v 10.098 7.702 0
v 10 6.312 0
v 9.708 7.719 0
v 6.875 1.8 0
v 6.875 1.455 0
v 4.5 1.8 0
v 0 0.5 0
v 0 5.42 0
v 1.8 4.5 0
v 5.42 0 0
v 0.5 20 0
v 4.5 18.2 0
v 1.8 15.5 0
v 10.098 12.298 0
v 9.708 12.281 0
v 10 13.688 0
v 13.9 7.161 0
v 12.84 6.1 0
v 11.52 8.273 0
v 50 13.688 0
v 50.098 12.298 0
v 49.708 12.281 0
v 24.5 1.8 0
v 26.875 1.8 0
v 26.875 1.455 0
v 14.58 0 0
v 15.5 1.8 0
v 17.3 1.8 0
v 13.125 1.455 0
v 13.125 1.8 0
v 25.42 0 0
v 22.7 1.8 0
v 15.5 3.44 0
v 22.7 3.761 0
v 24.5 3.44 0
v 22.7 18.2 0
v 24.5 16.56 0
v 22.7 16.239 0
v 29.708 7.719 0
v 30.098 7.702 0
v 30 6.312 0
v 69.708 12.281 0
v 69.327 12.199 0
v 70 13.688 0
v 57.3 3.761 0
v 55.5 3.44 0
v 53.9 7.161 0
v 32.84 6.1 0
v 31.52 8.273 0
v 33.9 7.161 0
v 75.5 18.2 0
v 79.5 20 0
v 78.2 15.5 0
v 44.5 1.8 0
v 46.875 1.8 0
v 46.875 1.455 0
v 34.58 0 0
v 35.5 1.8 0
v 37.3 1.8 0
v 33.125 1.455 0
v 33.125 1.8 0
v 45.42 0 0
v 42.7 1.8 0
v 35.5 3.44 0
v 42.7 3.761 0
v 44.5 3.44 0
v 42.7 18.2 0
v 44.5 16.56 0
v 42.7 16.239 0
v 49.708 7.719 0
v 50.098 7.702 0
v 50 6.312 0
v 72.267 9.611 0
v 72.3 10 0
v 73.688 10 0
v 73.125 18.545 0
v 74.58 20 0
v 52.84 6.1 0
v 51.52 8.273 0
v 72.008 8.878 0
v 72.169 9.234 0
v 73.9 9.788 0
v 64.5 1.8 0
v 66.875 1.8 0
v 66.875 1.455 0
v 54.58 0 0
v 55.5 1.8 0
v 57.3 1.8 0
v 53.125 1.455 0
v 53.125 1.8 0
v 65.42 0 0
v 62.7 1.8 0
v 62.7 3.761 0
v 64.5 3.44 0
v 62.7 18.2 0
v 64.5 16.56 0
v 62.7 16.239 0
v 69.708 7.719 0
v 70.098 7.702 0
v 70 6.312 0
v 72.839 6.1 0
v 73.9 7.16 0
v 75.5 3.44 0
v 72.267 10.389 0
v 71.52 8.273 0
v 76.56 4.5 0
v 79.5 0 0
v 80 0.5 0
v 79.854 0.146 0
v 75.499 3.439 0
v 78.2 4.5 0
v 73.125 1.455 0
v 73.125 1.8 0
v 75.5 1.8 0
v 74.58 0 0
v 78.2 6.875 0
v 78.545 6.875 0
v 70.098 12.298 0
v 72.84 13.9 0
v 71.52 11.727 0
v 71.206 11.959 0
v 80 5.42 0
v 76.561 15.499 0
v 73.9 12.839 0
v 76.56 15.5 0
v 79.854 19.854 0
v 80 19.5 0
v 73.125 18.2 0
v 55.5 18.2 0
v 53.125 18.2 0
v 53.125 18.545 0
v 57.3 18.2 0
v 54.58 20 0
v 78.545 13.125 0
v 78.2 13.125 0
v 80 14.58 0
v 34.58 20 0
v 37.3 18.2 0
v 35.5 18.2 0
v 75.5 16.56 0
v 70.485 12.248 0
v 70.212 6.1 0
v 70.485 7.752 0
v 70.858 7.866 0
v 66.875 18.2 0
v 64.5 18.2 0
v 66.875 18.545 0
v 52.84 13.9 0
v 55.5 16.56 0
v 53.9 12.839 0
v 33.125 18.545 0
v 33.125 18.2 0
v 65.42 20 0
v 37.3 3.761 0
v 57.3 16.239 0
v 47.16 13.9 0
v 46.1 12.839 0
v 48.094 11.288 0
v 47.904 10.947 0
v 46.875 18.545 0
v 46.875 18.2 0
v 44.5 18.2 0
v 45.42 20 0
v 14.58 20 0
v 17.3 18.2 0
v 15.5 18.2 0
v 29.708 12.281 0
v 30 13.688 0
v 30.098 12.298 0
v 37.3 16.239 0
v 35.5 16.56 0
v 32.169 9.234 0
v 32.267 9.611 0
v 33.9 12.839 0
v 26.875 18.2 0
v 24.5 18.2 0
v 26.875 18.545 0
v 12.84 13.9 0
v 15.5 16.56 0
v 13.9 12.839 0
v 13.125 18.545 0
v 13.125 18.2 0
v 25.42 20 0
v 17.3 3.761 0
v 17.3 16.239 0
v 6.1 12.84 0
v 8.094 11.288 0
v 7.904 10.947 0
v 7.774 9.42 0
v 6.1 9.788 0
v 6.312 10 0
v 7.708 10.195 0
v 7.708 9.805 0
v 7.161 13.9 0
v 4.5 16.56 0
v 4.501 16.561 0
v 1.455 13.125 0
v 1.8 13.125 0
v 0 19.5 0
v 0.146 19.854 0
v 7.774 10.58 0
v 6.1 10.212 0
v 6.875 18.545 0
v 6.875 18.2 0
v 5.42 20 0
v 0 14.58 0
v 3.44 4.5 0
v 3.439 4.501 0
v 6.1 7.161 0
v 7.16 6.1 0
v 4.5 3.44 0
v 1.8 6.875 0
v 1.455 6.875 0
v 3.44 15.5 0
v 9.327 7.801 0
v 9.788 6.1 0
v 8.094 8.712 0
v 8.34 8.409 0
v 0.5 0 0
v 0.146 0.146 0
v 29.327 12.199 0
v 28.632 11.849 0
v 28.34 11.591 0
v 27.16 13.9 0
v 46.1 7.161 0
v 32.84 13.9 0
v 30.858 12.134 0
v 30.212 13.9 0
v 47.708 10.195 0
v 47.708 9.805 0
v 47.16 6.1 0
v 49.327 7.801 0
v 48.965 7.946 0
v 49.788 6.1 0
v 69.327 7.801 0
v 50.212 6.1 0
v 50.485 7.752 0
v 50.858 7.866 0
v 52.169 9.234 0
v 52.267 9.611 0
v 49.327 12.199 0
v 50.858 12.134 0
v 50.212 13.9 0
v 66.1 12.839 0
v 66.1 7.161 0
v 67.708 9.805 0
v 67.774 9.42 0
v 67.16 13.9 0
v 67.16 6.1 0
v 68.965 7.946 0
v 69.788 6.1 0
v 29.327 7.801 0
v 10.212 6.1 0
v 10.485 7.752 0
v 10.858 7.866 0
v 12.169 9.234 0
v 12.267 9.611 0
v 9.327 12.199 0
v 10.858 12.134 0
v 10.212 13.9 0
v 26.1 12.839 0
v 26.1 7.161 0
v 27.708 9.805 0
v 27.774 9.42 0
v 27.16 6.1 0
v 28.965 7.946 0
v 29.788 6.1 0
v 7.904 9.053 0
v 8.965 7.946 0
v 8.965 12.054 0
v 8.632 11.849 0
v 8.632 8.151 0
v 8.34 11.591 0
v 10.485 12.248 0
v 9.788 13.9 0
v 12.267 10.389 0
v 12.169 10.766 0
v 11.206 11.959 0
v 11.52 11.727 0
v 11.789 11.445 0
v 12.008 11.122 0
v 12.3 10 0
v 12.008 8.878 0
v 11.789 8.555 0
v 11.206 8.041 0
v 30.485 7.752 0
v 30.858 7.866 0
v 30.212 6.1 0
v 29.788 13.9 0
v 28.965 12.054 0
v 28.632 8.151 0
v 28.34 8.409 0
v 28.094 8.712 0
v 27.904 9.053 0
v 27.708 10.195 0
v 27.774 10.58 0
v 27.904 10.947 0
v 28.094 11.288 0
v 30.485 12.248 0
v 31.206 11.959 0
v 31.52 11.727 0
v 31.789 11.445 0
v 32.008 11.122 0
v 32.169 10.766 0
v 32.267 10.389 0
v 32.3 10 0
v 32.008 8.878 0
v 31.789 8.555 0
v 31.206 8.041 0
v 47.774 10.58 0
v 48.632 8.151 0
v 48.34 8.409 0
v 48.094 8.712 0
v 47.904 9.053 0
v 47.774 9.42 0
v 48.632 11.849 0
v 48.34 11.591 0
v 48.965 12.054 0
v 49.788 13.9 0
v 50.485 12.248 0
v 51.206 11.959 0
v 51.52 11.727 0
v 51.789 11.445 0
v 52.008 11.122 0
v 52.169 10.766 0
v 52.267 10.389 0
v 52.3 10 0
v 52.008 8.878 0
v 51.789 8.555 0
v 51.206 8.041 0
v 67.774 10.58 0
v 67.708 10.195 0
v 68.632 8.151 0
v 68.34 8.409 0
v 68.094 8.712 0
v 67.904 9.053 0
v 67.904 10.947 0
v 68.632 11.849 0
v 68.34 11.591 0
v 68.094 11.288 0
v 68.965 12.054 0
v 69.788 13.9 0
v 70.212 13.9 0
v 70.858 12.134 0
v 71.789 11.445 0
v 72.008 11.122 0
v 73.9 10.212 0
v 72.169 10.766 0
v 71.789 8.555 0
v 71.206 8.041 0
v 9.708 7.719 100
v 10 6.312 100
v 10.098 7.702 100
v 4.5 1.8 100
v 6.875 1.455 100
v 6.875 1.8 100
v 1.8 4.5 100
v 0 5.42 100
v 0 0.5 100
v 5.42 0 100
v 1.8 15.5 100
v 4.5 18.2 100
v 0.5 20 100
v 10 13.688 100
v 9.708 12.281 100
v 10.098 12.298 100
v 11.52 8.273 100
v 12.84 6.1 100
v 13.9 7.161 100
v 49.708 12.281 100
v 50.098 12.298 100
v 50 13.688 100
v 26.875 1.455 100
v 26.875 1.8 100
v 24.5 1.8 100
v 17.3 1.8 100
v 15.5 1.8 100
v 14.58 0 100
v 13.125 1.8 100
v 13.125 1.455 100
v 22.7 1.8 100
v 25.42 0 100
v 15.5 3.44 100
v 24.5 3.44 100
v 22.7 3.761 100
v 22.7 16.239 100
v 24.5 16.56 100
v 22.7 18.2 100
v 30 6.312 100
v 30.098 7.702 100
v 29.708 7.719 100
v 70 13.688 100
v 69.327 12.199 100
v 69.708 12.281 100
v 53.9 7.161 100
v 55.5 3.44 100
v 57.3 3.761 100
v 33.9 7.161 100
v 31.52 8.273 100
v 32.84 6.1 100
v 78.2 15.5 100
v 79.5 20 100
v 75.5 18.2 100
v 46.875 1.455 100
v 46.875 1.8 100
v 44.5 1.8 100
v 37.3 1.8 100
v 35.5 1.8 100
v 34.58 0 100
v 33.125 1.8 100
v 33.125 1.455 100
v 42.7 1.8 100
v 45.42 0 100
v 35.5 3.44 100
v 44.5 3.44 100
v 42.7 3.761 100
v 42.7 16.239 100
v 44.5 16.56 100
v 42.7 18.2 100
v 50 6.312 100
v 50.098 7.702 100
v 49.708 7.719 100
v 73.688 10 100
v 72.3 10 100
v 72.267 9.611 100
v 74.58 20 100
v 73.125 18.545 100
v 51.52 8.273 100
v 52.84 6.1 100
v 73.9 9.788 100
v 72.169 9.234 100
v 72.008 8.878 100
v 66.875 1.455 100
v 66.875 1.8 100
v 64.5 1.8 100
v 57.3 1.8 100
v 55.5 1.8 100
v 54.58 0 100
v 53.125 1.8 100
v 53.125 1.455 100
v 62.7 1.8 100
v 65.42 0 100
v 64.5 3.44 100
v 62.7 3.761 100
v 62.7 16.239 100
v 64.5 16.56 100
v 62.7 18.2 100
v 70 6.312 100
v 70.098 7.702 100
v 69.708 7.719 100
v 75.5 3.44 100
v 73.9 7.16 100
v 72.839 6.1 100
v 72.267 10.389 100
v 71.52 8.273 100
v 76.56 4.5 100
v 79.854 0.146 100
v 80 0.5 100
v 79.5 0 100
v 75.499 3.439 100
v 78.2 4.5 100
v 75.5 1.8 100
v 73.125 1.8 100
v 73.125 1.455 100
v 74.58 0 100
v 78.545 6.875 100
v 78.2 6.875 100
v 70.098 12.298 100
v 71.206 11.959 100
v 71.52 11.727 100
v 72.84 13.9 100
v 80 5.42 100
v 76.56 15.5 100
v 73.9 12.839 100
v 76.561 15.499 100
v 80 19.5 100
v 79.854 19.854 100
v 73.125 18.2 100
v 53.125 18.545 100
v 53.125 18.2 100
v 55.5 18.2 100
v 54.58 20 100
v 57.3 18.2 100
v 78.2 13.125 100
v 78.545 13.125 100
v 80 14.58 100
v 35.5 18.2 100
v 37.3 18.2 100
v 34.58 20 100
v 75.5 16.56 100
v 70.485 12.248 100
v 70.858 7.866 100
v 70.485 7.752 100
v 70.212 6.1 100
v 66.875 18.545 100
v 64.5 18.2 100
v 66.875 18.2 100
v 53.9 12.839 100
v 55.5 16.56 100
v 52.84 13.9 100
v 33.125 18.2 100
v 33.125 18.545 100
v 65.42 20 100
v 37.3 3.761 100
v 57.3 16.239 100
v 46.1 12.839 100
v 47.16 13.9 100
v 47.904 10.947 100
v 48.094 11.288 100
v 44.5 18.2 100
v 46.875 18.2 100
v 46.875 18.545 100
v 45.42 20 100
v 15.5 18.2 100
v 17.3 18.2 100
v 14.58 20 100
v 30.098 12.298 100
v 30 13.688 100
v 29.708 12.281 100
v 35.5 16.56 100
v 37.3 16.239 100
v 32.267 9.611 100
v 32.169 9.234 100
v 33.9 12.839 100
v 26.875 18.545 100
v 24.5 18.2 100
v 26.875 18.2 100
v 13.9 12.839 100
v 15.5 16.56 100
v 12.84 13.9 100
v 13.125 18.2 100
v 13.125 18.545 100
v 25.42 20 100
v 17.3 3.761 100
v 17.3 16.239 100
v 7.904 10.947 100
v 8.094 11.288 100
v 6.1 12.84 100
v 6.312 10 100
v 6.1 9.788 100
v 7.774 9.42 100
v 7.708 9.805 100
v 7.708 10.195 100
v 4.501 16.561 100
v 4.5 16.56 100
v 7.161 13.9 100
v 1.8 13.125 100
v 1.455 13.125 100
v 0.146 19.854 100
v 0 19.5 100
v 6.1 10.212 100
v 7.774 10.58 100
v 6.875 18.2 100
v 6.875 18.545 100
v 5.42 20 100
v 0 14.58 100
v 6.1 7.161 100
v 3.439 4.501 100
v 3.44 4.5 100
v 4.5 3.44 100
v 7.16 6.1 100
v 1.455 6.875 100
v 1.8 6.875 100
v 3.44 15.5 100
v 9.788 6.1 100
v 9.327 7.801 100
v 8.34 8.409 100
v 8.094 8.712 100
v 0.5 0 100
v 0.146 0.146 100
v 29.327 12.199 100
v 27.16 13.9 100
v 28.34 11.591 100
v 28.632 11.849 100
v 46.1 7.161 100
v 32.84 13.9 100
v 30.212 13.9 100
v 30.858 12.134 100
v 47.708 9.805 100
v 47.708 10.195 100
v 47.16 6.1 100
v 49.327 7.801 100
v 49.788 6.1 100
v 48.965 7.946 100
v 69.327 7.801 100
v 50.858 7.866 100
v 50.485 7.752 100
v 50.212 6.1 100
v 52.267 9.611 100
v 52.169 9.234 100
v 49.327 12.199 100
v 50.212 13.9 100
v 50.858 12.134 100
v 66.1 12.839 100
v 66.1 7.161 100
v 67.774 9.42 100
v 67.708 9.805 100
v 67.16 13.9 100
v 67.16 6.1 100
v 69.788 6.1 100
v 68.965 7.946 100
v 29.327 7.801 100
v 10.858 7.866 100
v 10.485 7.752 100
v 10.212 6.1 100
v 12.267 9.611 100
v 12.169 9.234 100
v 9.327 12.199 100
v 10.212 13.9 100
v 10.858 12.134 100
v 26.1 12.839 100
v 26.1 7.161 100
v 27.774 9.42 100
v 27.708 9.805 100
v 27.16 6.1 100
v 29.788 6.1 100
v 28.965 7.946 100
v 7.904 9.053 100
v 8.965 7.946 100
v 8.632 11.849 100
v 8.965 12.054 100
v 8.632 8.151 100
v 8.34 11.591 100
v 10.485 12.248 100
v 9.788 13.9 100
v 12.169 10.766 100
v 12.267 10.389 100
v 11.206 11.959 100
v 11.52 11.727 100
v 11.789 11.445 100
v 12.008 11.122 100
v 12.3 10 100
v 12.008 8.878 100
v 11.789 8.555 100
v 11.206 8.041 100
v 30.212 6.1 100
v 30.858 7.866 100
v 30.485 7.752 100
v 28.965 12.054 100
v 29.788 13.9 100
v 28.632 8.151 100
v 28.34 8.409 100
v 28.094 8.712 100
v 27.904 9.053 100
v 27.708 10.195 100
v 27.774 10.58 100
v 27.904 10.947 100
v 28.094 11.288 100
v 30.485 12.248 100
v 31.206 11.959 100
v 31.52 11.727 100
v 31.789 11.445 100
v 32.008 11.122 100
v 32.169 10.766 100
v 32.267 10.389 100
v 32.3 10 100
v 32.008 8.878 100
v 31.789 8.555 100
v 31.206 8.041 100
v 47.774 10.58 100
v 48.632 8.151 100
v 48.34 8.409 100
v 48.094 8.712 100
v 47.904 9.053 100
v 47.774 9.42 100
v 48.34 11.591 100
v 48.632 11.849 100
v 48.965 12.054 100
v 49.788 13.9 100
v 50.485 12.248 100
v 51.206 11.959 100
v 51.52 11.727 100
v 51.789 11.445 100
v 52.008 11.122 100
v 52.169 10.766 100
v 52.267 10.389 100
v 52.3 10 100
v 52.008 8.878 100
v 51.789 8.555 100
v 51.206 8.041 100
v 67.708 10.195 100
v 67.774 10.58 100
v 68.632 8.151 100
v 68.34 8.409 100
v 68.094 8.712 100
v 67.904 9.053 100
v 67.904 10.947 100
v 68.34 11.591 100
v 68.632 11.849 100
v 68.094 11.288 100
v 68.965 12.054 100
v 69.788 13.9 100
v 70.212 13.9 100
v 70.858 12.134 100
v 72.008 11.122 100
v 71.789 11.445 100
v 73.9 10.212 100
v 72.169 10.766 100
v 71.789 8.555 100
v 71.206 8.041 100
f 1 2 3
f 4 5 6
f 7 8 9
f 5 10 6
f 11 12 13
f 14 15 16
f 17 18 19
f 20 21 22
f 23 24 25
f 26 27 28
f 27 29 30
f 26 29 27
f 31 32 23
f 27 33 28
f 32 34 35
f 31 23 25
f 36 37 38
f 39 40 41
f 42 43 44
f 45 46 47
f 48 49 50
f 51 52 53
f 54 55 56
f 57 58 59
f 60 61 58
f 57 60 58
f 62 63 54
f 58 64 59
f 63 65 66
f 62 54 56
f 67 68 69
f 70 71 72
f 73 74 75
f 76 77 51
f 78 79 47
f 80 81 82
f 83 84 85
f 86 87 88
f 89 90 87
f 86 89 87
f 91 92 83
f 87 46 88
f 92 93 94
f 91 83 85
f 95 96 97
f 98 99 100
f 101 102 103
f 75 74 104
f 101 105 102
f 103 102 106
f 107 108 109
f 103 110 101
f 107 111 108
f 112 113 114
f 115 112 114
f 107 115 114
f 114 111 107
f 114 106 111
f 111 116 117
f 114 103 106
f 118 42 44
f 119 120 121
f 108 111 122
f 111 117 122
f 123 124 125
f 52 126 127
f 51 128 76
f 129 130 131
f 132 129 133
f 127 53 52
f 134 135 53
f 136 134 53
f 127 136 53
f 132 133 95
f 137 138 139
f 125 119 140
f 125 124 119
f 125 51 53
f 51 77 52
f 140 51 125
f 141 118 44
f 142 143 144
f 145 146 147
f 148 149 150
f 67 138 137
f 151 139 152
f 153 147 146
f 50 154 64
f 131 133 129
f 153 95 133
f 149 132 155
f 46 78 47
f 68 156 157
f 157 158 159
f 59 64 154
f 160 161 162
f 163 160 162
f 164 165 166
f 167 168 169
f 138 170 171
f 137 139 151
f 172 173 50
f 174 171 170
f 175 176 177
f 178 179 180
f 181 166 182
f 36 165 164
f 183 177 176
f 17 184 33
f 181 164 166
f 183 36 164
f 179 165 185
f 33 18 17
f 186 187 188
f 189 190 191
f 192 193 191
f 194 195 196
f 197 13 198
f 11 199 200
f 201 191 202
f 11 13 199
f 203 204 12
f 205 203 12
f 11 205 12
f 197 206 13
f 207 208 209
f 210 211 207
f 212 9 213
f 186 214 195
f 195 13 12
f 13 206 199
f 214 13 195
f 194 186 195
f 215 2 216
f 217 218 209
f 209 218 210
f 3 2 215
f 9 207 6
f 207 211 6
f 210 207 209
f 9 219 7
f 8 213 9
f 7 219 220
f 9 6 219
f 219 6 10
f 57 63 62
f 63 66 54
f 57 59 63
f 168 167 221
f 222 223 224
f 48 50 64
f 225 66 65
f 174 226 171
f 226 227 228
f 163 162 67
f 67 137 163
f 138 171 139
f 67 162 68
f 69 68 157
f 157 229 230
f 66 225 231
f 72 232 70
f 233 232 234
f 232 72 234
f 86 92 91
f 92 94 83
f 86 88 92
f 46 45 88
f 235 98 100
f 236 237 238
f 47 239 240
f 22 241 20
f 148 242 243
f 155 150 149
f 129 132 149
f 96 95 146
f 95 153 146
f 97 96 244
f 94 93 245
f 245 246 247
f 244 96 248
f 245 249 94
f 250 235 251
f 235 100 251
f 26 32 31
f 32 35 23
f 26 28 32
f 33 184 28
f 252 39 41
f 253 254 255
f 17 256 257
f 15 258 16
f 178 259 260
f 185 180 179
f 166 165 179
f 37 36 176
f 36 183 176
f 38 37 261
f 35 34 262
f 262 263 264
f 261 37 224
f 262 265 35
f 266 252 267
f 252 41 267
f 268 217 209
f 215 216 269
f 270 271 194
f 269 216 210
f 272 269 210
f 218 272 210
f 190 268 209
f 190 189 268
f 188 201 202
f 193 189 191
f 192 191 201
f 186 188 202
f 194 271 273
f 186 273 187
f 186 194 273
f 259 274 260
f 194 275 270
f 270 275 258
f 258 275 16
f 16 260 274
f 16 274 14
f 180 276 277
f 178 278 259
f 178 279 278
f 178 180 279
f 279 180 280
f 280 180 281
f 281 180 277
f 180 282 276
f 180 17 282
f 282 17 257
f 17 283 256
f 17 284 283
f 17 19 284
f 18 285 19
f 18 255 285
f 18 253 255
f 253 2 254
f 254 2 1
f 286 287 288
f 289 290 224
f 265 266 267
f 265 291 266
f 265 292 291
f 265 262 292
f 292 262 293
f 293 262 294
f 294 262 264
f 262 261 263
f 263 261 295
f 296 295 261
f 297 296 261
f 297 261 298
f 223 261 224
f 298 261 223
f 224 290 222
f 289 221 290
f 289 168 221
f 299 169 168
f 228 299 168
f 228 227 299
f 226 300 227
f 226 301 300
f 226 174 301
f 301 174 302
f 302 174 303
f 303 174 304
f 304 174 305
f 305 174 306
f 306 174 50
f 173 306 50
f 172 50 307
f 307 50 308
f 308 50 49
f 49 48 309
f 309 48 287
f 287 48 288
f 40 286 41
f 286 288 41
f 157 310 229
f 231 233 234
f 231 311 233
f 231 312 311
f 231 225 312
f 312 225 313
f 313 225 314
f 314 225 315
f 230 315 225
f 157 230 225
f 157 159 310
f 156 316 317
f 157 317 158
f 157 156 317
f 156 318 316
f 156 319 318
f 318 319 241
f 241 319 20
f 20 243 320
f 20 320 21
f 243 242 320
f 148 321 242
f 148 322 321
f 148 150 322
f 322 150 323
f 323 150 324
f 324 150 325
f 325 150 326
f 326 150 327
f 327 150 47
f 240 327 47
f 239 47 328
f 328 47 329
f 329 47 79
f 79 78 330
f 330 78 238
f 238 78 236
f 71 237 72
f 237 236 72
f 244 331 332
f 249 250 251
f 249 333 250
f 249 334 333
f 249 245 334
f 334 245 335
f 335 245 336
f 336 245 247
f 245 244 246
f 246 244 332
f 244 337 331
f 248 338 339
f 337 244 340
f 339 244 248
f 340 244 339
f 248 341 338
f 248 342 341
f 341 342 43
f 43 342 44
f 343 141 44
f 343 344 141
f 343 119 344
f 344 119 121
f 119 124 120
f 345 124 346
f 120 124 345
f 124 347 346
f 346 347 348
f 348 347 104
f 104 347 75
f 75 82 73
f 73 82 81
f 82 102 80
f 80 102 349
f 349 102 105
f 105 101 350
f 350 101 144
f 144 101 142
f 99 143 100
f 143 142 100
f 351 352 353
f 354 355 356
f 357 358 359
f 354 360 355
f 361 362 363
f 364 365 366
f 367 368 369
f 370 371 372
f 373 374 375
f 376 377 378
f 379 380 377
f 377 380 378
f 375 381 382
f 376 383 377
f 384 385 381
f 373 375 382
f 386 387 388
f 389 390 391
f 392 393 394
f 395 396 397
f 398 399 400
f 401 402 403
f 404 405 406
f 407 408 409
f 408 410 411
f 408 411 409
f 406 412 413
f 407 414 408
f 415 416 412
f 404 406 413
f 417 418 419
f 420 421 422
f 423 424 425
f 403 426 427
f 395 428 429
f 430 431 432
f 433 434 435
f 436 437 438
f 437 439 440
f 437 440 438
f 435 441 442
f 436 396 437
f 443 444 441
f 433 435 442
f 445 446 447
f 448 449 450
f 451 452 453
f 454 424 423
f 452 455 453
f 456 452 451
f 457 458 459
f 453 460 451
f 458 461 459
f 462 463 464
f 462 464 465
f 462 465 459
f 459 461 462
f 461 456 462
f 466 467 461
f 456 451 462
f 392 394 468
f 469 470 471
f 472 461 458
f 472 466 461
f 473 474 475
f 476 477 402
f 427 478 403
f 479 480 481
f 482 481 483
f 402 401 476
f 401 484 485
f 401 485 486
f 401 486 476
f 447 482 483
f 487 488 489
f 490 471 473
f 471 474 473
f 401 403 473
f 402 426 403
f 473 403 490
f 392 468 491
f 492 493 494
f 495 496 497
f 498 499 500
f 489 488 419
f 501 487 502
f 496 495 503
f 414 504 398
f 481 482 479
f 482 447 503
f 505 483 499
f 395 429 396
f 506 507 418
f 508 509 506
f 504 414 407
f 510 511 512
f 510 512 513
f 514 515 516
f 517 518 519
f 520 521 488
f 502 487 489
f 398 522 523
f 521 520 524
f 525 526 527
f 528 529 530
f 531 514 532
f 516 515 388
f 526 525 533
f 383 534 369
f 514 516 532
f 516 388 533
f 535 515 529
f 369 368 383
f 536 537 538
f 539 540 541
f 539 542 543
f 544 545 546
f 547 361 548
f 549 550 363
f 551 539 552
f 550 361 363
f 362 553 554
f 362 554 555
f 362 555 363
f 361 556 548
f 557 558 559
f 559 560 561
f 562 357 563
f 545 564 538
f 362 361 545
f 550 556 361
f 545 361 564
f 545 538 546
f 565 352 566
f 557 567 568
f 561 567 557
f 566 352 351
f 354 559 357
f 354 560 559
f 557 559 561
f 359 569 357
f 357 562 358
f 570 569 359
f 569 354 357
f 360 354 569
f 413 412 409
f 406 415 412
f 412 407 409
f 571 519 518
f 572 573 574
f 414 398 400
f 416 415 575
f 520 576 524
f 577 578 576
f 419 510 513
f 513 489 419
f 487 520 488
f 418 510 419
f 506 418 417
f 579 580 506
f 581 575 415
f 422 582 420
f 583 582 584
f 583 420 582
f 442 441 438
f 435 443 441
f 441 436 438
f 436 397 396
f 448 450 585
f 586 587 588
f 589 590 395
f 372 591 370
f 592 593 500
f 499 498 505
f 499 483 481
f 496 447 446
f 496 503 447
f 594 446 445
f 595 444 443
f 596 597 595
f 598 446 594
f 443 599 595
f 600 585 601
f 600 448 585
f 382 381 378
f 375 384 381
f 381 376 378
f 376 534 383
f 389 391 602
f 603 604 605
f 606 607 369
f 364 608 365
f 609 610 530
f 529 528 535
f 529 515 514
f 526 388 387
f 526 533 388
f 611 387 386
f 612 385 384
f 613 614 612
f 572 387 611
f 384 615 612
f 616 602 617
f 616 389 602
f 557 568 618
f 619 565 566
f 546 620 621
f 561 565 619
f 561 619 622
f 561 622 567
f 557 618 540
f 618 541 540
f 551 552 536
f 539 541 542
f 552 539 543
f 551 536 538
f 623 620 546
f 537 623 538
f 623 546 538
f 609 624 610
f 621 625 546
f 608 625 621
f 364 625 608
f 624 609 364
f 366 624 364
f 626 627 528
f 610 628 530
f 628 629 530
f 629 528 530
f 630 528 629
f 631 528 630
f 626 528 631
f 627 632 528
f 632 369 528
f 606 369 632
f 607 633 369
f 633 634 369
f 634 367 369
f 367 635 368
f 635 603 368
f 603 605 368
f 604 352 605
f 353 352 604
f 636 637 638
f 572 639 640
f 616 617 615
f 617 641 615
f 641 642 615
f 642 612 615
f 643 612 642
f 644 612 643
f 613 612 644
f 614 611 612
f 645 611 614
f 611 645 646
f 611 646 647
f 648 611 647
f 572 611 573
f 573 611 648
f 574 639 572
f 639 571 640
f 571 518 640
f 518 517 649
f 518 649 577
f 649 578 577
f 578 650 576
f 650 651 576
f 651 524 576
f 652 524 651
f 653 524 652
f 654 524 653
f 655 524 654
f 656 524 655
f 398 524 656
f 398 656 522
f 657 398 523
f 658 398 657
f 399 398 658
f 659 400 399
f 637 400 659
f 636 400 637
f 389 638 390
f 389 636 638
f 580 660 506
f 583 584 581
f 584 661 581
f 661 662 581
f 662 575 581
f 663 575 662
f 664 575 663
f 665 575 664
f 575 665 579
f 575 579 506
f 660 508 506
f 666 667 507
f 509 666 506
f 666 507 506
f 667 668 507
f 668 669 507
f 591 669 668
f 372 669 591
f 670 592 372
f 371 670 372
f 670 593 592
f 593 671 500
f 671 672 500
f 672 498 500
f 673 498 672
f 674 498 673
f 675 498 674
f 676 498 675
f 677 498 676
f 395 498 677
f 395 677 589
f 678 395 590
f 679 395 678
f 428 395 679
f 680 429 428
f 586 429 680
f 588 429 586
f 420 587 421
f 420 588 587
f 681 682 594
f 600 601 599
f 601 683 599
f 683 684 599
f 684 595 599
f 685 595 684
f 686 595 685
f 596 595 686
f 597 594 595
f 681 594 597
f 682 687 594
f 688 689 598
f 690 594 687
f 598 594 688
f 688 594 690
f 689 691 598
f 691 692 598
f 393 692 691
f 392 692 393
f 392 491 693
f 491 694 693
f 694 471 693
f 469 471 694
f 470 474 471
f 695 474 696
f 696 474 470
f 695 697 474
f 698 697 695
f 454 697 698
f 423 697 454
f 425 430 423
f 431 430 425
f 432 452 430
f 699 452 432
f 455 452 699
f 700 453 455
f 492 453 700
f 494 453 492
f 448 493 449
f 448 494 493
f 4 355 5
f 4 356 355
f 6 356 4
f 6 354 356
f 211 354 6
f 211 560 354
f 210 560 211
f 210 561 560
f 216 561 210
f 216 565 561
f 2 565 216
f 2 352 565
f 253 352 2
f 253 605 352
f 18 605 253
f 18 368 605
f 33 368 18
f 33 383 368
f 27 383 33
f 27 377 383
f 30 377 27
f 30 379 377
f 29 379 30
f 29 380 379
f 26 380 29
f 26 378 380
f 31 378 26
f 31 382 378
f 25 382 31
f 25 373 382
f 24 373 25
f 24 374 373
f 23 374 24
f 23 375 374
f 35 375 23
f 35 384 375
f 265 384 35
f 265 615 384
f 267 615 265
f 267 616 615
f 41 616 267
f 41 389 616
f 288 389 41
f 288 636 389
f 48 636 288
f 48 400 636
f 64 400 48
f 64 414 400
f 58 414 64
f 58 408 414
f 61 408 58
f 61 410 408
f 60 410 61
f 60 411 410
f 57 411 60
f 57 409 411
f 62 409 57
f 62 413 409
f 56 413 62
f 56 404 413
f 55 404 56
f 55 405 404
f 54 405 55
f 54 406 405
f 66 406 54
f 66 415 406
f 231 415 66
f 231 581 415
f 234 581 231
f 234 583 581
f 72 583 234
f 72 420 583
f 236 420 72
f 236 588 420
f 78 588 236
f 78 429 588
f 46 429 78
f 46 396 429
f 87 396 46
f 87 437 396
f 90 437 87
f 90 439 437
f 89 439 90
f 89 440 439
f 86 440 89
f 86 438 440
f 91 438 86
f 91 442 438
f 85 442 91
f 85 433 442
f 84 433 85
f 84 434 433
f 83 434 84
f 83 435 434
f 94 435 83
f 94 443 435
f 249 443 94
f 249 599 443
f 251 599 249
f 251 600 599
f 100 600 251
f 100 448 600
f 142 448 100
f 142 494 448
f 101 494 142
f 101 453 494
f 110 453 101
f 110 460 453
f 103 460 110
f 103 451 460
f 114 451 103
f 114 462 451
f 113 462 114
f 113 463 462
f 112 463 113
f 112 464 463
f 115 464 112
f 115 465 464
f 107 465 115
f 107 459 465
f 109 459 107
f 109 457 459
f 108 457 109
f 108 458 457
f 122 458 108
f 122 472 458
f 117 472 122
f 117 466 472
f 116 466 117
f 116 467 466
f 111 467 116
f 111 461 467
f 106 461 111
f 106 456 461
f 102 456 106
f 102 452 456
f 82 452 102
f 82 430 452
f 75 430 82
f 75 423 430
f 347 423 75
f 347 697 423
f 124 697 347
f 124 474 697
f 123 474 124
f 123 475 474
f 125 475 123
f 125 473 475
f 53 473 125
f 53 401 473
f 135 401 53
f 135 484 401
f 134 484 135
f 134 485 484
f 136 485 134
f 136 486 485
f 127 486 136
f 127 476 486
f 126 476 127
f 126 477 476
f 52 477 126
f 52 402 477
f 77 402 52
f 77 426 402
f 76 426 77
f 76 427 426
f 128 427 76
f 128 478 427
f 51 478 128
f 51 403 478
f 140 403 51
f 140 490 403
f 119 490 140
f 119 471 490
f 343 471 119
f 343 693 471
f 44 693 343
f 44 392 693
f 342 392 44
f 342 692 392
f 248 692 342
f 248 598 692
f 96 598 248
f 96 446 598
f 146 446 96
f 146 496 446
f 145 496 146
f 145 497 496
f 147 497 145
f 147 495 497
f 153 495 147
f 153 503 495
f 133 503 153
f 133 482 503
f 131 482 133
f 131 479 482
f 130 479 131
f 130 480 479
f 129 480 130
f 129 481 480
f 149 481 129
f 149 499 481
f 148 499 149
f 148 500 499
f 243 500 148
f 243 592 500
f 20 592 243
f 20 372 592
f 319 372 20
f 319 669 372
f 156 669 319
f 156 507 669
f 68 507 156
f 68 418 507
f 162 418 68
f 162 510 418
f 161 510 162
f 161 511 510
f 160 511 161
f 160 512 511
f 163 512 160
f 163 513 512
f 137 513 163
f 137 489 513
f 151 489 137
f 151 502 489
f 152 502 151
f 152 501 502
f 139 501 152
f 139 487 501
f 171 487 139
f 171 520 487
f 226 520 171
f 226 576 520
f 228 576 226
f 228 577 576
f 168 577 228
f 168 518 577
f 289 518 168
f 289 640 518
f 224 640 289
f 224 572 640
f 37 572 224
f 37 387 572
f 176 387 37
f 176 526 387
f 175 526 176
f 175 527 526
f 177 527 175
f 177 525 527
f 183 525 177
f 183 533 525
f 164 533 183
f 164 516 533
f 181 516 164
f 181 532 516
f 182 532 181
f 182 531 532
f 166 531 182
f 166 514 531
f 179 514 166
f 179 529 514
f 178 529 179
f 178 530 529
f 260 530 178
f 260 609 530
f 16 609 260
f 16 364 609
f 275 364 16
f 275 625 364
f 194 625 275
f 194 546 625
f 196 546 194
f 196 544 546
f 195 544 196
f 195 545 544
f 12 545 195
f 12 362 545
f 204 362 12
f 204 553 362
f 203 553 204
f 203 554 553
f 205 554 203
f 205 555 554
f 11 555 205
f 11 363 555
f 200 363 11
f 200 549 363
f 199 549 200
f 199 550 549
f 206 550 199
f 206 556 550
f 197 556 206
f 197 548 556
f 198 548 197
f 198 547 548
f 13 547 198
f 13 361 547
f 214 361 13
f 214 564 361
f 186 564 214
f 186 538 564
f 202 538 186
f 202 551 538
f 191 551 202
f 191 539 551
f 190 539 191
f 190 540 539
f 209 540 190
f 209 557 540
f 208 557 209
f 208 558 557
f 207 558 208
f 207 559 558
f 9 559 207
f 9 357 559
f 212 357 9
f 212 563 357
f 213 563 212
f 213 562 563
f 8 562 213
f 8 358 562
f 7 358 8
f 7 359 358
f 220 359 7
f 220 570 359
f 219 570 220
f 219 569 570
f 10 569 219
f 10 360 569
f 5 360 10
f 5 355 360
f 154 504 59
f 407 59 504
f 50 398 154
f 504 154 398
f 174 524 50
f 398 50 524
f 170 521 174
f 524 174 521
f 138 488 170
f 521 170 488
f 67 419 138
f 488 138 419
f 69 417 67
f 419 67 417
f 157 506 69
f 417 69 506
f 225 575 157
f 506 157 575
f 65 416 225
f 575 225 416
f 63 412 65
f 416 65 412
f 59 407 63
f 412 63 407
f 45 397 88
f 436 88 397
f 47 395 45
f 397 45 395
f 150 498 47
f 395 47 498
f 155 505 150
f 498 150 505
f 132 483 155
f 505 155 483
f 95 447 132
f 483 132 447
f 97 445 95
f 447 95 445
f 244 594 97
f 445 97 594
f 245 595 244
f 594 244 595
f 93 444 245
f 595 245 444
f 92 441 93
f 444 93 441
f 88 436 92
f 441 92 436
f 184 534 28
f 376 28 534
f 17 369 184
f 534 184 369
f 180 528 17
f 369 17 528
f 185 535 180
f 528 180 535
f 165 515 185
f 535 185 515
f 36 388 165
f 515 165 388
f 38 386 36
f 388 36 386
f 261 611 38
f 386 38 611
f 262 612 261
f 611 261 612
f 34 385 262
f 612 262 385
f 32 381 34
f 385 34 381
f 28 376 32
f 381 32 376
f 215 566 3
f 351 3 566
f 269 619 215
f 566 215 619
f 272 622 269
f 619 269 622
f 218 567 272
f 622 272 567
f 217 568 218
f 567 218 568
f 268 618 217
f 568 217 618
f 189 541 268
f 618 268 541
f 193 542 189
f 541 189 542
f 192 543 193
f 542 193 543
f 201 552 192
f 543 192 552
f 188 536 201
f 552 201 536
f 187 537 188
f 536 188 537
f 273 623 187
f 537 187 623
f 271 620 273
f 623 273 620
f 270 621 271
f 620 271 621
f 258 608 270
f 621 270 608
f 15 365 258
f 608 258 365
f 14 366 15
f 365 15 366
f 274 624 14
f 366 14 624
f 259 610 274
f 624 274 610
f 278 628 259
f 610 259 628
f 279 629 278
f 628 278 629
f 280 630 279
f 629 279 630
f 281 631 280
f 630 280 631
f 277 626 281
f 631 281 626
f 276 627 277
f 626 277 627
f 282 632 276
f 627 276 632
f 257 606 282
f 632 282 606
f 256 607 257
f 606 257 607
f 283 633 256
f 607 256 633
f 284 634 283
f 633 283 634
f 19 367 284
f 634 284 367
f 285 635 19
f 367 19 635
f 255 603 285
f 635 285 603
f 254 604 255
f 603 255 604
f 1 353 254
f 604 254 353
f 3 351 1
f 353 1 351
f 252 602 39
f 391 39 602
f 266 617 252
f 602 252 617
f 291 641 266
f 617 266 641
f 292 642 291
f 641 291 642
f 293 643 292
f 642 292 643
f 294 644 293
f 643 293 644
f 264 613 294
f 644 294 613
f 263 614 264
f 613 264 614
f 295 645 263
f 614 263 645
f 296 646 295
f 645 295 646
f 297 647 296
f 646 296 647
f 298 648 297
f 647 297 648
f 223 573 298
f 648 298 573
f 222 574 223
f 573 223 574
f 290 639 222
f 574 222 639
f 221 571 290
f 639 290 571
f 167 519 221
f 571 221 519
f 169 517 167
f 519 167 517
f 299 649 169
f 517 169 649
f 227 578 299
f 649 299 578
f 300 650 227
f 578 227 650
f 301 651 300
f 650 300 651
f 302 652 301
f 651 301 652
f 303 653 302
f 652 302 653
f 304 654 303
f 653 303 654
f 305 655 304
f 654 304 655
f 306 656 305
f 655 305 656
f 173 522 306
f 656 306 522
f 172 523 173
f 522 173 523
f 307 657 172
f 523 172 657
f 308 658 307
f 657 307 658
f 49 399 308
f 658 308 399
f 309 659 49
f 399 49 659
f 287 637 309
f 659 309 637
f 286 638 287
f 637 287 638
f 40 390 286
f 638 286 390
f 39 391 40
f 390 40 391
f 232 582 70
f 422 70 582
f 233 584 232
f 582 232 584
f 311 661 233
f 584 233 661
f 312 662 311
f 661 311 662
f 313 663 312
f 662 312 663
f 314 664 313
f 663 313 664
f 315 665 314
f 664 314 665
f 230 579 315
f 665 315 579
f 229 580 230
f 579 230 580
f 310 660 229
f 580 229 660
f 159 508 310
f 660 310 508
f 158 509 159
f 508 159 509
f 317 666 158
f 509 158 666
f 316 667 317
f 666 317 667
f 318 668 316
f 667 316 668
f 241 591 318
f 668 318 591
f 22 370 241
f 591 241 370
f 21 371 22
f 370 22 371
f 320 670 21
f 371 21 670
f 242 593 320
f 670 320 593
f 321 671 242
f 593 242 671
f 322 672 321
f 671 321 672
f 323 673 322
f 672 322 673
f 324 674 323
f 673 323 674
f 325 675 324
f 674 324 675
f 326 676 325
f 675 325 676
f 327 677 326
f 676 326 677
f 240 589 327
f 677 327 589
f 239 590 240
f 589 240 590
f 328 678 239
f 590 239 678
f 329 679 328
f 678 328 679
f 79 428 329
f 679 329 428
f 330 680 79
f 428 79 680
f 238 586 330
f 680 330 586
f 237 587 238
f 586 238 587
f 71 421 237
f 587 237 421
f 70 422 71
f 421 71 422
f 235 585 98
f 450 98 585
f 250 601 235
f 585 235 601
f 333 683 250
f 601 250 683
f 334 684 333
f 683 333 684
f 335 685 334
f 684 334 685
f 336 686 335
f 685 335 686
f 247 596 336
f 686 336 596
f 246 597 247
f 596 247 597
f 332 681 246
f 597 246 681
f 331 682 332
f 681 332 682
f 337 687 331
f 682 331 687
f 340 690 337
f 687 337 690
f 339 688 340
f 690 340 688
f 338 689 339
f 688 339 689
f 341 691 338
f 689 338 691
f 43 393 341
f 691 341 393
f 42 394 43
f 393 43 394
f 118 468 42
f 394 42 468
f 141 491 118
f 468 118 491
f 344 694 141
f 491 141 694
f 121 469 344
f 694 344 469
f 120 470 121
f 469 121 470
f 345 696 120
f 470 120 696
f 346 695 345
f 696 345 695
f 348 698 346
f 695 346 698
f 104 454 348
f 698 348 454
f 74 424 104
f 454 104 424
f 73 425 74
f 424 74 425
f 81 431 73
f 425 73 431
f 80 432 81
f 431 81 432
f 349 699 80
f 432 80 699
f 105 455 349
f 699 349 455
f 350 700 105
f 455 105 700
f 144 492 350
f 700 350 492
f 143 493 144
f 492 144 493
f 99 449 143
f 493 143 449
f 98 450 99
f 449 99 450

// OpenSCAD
$fa = 1.0;
$fs = 0.4;

module center(l=1,r=1,t=1,b=1){
    difference(){
        translate([-3.9,-3.9,0]) square(7.8);
        circle(r=2.3);
        if(t==1) {translate([0,3.688,0]) rotate([0,0,45]) square(0.3);}
        if(b==1) {translate([0,-4.112,0]) rotate([0,0,45]) square(0.3);}
        if(r==1) {translate([3.9,-0.212,0]) rotate([0,0,45]) square(0.3);}
        if(l==1) {translate([-3.9,-0.212,0]) rotate([0,0,45]) square(0.3);}
   }
}
 
module corner(){
    translate([0.5,0.5,0]) circle(r=0.5);
    hull(){
        translate([0.5,0,0]) square([4.92,1.8]);
        translate([0.5,1.455,0]) square([6.375,0.345]);
    }
    hull(){
        translate([0,0.5,0]) square([1.8,4.92]);
        translate([1.455,0.5,0]) square([0.345,6.375]);
    }
    translate([1.8,1.8,0]) square(2.7);
    translate([4.5,3.44,0]) rotate([0,0,45]) square([3.763,1.5]);
}

module mids(){
    hull(){
        translate([-5.42,0,0]) square([10.84,1.8]);
        translate([-6.875,1.455,0]) square([13.75,0.345]);
    }
    translate([2.7,1.8,0]) square([1.8,1.961]);
    translate([-4.5,1.8,0]) square([1.8,1.961]);
    translate([2.7,3.761,0]) rotate([0,0,-45]) square([1.5,4.808]);
    translate([-2.7,3.761,0]) rotate([0,0,45]) translate([-1.5,0,0]) square([1.5,4.808]);
}
 
module vslot2080(){
   corner();
   translate([80,0,0]) rotate([0,0,90]) corner();
   translate([80,20,0]) rotate([0,0,180]) corner();
   translate([0,20,0]) rotate([0,0,270]) corner();
   translate([20,0,0]) mids();
   translate([20,20]) rotate([0,0,180]) mids();
   translate([40,0,0]) mids();
   translate([40,20]) rotate([0,0,180]) mids();
   translate([60,0,0]) mids();
   translate([60,20]) rotate([0,0,180]) mids();
   translate([10,10,0]) center(l=1,r=0,t=1,b=1);
   translate([30,10,0]) center(l=0,r=0,t=1,b=1);
   translate([50,10,0]) center(l=0,r=0,t=1,b=1);
   translate([70,10,0]) center(l=0,r=1,t=1,b=1);
}
 
 // linear extrude height is desired length of v-slot
 color("slategray"){
     linear_extrude(height=100) vslot2080();
 }
